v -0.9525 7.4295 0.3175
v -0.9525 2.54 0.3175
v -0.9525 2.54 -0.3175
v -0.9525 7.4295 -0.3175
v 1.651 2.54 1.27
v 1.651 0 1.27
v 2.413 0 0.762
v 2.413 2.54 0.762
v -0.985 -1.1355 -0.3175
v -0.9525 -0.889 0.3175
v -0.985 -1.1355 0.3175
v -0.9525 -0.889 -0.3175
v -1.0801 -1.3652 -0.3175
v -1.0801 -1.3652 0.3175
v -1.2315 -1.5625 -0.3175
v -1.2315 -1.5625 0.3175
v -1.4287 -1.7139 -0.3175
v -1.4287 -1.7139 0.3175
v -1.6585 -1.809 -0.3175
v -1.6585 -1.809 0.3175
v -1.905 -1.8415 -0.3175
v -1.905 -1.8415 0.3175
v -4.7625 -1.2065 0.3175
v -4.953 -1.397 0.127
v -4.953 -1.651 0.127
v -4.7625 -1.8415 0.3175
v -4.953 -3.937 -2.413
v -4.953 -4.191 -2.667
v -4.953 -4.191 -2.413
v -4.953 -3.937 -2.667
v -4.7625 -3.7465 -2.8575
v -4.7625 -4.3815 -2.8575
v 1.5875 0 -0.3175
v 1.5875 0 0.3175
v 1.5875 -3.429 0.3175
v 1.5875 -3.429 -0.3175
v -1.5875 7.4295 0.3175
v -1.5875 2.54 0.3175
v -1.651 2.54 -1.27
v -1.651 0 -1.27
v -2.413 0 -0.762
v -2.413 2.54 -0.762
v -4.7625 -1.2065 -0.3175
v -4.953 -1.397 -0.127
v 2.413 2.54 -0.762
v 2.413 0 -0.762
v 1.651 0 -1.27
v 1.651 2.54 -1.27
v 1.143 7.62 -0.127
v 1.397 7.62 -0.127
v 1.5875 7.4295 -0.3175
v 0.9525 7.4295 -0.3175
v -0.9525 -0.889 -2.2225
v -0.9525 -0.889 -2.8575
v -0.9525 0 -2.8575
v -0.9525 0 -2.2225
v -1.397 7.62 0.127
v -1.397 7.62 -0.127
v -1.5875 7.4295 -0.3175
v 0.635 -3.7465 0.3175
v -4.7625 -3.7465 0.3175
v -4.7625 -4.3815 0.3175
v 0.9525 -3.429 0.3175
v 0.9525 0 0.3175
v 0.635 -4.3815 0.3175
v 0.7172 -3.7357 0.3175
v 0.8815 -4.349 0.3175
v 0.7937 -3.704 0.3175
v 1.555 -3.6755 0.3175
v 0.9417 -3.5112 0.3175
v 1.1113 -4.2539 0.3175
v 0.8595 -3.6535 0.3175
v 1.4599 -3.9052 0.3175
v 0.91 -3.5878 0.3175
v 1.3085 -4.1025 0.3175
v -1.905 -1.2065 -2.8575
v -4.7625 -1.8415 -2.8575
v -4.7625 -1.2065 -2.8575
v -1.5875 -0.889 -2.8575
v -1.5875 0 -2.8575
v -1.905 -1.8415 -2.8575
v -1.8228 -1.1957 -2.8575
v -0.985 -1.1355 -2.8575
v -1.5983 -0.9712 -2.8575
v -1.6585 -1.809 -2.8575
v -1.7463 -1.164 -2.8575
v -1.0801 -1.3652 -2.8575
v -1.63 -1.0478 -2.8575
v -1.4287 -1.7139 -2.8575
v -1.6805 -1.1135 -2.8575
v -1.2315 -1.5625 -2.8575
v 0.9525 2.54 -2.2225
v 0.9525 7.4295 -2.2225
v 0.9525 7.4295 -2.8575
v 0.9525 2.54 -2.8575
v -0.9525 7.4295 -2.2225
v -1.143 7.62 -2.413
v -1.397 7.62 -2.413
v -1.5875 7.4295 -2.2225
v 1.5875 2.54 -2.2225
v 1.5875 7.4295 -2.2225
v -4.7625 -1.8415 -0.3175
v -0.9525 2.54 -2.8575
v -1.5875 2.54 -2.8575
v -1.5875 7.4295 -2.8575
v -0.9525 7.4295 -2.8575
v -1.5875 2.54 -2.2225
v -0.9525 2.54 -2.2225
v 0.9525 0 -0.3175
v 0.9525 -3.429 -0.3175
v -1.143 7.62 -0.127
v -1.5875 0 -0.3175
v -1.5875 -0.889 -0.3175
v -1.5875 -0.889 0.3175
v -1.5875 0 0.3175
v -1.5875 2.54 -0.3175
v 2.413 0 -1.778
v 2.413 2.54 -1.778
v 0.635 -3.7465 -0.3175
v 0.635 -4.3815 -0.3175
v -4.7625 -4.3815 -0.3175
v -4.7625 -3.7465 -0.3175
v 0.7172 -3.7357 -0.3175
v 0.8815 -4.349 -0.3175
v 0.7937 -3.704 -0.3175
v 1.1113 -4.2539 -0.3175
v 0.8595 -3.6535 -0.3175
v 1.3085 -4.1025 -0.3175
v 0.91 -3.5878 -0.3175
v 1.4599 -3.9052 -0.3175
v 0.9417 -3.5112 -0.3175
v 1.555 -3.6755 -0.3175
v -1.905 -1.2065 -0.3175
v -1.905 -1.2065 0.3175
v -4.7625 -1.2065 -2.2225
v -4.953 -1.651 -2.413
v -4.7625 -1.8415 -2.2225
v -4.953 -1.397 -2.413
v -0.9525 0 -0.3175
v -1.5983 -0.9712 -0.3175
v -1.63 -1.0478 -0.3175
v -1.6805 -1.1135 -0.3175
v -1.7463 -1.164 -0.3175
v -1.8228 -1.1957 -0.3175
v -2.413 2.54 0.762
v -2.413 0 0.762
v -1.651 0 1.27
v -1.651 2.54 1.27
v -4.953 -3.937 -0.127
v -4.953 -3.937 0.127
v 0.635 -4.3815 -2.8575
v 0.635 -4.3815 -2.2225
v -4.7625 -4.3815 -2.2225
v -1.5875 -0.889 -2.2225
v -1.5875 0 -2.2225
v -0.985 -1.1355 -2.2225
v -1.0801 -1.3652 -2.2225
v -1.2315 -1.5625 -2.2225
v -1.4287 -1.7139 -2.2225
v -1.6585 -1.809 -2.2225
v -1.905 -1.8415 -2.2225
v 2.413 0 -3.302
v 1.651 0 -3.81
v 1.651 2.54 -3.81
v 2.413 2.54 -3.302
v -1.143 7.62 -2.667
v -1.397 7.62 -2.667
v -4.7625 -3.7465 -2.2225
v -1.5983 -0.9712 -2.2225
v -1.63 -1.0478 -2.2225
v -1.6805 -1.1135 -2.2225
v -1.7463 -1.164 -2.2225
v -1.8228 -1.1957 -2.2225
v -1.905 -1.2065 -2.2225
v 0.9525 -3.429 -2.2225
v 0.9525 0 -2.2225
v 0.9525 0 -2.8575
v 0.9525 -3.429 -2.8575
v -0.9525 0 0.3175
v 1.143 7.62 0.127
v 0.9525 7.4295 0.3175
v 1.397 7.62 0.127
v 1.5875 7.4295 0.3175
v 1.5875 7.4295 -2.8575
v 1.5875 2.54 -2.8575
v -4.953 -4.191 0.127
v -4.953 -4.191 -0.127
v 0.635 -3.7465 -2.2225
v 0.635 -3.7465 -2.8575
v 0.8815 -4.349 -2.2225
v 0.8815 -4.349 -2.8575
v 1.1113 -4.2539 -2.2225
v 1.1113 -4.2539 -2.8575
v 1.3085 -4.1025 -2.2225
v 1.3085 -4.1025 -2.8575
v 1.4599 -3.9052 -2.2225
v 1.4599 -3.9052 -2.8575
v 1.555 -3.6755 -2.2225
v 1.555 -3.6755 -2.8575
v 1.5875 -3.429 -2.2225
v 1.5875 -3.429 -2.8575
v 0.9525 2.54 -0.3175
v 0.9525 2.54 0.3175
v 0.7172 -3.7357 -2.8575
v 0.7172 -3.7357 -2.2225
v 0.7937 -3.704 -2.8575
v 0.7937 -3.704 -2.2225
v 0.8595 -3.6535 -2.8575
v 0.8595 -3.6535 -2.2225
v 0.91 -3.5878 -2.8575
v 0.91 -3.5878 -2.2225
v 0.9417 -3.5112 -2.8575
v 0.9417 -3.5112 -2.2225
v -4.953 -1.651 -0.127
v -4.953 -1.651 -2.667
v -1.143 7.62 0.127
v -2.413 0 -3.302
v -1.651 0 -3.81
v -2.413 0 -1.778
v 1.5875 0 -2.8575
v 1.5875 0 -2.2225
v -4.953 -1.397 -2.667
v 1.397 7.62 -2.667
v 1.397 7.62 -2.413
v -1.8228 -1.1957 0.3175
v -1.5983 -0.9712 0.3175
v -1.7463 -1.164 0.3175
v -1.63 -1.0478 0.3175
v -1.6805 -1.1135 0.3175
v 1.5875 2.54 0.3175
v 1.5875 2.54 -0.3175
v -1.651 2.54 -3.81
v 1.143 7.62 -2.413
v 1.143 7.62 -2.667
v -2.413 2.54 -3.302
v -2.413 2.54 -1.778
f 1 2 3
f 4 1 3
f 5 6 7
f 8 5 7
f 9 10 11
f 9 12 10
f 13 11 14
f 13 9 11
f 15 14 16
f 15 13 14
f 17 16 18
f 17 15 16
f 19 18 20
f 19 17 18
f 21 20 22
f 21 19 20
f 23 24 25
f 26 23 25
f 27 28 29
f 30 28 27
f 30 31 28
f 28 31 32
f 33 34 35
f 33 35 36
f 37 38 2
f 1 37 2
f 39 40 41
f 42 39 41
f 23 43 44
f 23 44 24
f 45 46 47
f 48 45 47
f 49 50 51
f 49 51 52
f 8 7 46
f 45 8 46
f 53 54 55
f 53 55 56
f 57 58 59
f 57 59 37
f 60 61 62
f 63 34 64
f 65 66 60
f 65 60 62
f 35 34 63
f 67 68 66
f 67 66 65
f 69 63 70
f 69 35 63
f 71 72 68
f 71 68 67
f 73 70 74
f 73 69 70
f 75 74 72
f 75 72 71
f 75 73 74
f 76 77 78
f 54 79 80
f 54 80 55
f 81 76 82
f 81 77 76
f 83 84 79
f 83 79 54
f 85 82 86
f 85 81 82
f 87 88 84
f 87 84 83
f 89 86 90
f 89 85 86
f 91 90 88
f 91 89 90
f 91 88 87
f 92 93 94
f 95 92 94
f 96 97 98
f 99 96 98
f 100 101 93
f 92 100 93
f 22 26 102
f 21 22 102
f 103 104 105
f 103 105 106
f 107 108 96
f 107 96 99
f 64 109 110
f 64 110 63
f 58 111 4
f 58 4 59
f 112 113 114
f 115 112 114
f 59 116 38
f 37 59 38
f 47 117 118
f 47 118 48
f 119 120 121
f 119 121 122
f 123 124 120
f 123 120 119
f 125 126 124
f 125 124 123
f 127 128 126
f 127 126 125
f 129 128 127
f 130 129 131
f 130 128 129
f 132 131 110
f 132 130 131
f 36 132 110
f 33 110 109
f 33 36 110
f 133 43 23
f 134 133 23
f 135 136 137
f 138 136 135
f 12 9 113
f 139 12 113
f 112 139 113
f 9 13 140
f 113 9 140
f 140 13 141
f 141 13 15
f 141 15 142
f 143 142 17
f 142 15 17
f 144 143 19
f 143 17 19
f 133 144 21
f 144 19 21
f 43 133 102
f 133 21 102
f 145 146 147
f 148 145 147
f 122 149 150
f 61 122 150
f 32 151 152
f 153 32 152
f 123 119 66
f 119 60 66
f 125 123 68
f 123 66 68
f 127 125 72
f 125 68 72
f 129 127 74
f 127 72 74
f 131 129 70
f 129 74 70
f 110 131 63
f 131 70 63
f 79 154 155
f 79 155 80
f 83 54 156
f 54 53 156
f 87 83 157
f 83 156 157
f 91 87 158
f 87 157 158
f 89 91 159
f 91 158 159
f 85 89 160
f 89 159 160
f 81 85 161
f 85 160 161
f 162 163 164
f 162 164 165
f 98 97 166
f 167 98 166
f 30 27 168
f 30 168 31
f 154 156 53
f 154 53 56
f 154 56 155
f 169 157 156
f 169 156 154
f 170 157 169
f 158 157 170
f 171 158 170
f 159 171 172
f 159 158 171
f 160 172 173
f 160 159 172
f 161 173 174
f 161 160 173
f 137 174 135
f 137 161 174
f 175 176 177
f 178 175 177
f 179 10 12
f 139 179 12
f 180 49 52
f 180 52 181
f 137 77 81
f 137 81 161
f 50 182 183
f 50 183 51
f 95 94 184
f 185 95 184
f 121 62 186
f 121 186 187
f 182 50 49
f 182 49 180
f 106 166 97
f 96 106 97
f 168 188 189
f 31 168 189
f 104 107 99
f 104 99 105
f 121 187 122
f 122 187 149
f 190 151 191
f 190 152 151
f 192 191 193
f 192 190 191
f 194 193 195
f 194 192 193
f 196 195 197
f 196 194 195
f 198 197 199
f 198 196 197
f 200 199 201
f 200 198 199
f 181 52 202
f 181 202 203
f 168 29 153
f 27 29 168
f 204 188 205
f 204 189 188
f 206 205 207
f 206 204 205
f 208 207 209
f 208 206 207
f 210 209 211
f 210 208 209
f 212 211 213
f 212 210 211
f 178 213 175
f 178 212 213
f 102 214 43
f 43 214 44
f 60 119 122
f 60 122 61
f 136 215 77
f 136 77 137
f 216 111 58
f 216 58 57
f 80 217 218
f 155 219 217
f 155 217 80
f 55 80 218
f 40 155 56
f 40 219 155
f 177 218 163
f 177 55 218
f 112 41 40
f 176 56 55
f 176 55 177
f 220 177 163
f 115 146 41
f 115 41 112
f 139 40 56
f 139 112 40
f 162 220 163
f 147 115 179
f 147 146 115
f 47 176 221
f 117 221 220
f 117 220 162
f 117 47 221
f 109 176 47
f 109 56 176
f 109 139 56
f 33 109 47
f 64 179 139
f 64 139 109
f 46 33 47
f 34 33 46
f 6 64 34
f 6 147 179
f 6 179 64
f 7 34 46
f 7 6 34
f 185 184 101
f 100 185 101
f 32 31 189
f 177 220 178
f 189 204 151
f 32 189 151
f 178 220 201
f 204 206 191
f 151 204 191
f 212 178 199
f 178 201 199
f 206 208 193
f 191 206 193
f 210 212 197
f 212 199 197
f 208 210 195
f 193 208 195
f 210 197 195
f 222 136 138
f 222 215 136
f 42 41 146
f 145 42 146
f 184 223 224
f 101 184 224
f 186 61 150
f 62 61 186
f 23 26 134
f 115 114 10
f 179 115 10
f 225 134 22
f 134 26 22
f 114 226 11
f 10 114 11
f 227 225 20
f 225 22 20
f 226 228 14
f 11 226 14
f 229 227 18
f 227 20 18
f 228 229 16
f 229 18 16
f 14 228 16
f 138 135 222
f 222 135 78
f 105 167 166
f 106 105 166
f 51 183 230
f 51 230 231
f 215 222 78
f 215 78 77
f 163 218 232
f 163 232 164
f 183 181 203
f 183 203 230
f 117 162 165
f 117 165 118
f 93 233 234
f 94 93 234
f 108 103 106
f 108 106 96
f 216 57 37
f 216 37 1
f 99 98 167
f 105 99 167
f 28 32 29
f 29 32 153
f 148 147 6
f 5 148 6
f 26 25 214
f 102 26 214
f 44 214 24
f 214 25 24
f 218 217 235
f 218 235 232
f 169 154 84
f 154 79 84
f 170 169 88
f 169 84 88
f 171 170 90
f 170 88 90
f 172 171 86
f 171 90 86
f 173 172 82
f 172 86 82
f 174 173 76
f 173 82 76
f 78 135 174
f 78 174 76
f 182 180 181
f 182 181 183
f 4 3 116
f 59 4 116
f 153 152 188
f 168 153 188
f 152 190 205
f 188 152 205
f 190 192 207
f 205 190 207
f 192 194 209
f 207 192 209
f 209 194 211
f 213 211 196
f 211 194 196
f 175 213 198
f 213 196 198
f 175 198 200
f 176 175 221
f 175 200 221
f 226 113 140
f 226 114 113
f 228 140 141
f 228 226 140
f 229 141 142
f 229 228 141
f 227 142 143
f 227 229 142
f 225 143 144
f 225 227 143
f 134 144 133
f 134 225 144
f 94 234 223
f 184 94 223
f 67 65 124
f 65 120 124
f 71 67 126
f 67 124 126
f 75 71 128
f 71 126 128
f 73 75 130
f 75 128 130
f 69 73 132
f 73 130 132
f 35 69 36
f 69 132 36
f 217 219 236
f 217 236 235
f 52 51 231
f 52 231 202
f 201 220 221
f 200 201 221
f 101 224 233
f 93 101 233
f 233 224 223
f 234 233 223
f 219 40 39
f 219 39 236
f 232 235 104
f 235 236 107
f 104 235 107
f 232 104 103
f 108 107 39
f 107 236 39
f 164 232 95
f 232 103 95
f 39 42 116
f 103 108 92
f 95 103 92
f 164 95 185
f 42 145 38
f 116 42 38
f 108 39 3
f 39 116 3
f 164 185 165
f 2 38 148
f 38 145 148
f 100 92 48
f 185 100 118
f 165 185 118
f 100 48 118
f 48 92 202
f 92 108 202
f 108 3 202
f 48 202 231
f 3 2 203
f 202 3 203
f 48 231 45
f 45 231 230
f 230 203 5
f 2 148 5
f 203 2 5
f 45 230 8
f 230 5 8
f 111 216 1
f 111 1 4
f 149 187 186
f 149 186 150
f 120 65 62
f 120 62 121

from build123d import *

# Parameters (mm, degrees)
BOSS_EXTRUDE2_DEPTH = 2.54
SKETCH5_W           = 0.635
SKETCH5_H           = 0.635
SKETCH6_W           = 0.635
SKETCH6_H           = 0.635
CHAMFER1_SIZE       = 0.1905


with BuildPart() as part:
    # Sketch1 → Boss-Extrude2 (new body)
    with BuildSketch(Plane(origin=(0, 0, 0), x_dir=(1, 0, 0), z_dir=(0, 1, 0))):
        Polygon((-2.413, -0.762), (-1.651, -1.27), (1.651, -1.27), (2.413, -0.762), (2.413, 0.762), (1.651, 1.27), (-1.651, 1.27), (-2.413, 0.762), align=None)
    extrude(amount=BOSS_EXTRUDE2_DEPTH)

    # Sweep5: sweep along a path in Sketch2
    with BuildLine(Plane.XY) as sweep5_path:
        Line((-1.27, 7.62), (-1.27, 2.54))
        Line((-1.27, 2.54), (-1.27, -0.889))
        ThreePointArc((-1.27, -0.889), (-1.455987194, -1.338012806), (-1.905, -1.524))
        Line((-1.905, -1.524), (-4.953, -1.524))
    # Sketch5 → Sweep5 (sweep)
    with BuildSketch(Plane(origin=(0, 7.62, 0), x_dir=(1, 0, 0), z_dir=(0, 1, 0))):
        with Locations((-1.27, 0)):
            Rectangle(SKETCH5_W, SKETCH5_H)
    sweep(path=sweep5_path.line)

    # Sweep6: sweep along a path in Sketch7
    with BuildLine(Plane.XY) as sweep6_path:
        Line((-4.953, -4.064), (0.635, -4.064))
        ThreePointArc((0.635, -4.064), (1.084012806, -3.878012806), (1.27, -3.429))
        Line((1.27, -3.429), (1.27, 2.54))
        Line((1.27, 2.54), (1.27, 7.62))
    # Sketch6 → Sweep6 (sweep)
    with BuildSketch(Plane(origin=(0, 7.62, 0), x_dir=(1, 0, 0), z_dir=(0, 1, 0))):
        with Locations((1.27, 0)):
            Rectangle(SKETCH6_W, SKETCH6_H)
    sweep(path=sweep6_path.line)

    # Chamfer1
    chamfer1_edges = [part.edges().sort_by_distance(p)[0] for p in [
        (-4.953, -1.524, -0.3175),
        (-4.953, -1.8415, 0),
        (-4.953, -1.524, 0.3175),
        (-4.953, -1.2065, 0),
        (-1.27, 7.62, -0.3175),
        (-0.9525, 7.62, 0),
        (-1.27, 7.62, 0.3175),
        (-1.5875, 7.62, 0),
        (1.5875, 7.62, 0),
        (1.27, 7.62, -0.3175),
        (0.9525, 7.62, 0),
        (1.27, 7.62, 0.3175),
        (-4.953, -4.3815, 0),
        (-4.953, -4.064, -0.3175),
        (-4.953, -3.7465, 0),
        (-4.953, -4.064, 0.3175),
    ]]
    chamfer(chamfer1_edges, length=CHAMFER1_SIZE)

    # Mirror1: part across plane


with BuildPart() as part_1:
    add(part.part)
    add(part.part.mirror(Plane(origin=(-1.651, 2.54, -1.27), x_dir=(1, 0, 0), z_dir=(0, 0, 1))))


solid = part_1.part
